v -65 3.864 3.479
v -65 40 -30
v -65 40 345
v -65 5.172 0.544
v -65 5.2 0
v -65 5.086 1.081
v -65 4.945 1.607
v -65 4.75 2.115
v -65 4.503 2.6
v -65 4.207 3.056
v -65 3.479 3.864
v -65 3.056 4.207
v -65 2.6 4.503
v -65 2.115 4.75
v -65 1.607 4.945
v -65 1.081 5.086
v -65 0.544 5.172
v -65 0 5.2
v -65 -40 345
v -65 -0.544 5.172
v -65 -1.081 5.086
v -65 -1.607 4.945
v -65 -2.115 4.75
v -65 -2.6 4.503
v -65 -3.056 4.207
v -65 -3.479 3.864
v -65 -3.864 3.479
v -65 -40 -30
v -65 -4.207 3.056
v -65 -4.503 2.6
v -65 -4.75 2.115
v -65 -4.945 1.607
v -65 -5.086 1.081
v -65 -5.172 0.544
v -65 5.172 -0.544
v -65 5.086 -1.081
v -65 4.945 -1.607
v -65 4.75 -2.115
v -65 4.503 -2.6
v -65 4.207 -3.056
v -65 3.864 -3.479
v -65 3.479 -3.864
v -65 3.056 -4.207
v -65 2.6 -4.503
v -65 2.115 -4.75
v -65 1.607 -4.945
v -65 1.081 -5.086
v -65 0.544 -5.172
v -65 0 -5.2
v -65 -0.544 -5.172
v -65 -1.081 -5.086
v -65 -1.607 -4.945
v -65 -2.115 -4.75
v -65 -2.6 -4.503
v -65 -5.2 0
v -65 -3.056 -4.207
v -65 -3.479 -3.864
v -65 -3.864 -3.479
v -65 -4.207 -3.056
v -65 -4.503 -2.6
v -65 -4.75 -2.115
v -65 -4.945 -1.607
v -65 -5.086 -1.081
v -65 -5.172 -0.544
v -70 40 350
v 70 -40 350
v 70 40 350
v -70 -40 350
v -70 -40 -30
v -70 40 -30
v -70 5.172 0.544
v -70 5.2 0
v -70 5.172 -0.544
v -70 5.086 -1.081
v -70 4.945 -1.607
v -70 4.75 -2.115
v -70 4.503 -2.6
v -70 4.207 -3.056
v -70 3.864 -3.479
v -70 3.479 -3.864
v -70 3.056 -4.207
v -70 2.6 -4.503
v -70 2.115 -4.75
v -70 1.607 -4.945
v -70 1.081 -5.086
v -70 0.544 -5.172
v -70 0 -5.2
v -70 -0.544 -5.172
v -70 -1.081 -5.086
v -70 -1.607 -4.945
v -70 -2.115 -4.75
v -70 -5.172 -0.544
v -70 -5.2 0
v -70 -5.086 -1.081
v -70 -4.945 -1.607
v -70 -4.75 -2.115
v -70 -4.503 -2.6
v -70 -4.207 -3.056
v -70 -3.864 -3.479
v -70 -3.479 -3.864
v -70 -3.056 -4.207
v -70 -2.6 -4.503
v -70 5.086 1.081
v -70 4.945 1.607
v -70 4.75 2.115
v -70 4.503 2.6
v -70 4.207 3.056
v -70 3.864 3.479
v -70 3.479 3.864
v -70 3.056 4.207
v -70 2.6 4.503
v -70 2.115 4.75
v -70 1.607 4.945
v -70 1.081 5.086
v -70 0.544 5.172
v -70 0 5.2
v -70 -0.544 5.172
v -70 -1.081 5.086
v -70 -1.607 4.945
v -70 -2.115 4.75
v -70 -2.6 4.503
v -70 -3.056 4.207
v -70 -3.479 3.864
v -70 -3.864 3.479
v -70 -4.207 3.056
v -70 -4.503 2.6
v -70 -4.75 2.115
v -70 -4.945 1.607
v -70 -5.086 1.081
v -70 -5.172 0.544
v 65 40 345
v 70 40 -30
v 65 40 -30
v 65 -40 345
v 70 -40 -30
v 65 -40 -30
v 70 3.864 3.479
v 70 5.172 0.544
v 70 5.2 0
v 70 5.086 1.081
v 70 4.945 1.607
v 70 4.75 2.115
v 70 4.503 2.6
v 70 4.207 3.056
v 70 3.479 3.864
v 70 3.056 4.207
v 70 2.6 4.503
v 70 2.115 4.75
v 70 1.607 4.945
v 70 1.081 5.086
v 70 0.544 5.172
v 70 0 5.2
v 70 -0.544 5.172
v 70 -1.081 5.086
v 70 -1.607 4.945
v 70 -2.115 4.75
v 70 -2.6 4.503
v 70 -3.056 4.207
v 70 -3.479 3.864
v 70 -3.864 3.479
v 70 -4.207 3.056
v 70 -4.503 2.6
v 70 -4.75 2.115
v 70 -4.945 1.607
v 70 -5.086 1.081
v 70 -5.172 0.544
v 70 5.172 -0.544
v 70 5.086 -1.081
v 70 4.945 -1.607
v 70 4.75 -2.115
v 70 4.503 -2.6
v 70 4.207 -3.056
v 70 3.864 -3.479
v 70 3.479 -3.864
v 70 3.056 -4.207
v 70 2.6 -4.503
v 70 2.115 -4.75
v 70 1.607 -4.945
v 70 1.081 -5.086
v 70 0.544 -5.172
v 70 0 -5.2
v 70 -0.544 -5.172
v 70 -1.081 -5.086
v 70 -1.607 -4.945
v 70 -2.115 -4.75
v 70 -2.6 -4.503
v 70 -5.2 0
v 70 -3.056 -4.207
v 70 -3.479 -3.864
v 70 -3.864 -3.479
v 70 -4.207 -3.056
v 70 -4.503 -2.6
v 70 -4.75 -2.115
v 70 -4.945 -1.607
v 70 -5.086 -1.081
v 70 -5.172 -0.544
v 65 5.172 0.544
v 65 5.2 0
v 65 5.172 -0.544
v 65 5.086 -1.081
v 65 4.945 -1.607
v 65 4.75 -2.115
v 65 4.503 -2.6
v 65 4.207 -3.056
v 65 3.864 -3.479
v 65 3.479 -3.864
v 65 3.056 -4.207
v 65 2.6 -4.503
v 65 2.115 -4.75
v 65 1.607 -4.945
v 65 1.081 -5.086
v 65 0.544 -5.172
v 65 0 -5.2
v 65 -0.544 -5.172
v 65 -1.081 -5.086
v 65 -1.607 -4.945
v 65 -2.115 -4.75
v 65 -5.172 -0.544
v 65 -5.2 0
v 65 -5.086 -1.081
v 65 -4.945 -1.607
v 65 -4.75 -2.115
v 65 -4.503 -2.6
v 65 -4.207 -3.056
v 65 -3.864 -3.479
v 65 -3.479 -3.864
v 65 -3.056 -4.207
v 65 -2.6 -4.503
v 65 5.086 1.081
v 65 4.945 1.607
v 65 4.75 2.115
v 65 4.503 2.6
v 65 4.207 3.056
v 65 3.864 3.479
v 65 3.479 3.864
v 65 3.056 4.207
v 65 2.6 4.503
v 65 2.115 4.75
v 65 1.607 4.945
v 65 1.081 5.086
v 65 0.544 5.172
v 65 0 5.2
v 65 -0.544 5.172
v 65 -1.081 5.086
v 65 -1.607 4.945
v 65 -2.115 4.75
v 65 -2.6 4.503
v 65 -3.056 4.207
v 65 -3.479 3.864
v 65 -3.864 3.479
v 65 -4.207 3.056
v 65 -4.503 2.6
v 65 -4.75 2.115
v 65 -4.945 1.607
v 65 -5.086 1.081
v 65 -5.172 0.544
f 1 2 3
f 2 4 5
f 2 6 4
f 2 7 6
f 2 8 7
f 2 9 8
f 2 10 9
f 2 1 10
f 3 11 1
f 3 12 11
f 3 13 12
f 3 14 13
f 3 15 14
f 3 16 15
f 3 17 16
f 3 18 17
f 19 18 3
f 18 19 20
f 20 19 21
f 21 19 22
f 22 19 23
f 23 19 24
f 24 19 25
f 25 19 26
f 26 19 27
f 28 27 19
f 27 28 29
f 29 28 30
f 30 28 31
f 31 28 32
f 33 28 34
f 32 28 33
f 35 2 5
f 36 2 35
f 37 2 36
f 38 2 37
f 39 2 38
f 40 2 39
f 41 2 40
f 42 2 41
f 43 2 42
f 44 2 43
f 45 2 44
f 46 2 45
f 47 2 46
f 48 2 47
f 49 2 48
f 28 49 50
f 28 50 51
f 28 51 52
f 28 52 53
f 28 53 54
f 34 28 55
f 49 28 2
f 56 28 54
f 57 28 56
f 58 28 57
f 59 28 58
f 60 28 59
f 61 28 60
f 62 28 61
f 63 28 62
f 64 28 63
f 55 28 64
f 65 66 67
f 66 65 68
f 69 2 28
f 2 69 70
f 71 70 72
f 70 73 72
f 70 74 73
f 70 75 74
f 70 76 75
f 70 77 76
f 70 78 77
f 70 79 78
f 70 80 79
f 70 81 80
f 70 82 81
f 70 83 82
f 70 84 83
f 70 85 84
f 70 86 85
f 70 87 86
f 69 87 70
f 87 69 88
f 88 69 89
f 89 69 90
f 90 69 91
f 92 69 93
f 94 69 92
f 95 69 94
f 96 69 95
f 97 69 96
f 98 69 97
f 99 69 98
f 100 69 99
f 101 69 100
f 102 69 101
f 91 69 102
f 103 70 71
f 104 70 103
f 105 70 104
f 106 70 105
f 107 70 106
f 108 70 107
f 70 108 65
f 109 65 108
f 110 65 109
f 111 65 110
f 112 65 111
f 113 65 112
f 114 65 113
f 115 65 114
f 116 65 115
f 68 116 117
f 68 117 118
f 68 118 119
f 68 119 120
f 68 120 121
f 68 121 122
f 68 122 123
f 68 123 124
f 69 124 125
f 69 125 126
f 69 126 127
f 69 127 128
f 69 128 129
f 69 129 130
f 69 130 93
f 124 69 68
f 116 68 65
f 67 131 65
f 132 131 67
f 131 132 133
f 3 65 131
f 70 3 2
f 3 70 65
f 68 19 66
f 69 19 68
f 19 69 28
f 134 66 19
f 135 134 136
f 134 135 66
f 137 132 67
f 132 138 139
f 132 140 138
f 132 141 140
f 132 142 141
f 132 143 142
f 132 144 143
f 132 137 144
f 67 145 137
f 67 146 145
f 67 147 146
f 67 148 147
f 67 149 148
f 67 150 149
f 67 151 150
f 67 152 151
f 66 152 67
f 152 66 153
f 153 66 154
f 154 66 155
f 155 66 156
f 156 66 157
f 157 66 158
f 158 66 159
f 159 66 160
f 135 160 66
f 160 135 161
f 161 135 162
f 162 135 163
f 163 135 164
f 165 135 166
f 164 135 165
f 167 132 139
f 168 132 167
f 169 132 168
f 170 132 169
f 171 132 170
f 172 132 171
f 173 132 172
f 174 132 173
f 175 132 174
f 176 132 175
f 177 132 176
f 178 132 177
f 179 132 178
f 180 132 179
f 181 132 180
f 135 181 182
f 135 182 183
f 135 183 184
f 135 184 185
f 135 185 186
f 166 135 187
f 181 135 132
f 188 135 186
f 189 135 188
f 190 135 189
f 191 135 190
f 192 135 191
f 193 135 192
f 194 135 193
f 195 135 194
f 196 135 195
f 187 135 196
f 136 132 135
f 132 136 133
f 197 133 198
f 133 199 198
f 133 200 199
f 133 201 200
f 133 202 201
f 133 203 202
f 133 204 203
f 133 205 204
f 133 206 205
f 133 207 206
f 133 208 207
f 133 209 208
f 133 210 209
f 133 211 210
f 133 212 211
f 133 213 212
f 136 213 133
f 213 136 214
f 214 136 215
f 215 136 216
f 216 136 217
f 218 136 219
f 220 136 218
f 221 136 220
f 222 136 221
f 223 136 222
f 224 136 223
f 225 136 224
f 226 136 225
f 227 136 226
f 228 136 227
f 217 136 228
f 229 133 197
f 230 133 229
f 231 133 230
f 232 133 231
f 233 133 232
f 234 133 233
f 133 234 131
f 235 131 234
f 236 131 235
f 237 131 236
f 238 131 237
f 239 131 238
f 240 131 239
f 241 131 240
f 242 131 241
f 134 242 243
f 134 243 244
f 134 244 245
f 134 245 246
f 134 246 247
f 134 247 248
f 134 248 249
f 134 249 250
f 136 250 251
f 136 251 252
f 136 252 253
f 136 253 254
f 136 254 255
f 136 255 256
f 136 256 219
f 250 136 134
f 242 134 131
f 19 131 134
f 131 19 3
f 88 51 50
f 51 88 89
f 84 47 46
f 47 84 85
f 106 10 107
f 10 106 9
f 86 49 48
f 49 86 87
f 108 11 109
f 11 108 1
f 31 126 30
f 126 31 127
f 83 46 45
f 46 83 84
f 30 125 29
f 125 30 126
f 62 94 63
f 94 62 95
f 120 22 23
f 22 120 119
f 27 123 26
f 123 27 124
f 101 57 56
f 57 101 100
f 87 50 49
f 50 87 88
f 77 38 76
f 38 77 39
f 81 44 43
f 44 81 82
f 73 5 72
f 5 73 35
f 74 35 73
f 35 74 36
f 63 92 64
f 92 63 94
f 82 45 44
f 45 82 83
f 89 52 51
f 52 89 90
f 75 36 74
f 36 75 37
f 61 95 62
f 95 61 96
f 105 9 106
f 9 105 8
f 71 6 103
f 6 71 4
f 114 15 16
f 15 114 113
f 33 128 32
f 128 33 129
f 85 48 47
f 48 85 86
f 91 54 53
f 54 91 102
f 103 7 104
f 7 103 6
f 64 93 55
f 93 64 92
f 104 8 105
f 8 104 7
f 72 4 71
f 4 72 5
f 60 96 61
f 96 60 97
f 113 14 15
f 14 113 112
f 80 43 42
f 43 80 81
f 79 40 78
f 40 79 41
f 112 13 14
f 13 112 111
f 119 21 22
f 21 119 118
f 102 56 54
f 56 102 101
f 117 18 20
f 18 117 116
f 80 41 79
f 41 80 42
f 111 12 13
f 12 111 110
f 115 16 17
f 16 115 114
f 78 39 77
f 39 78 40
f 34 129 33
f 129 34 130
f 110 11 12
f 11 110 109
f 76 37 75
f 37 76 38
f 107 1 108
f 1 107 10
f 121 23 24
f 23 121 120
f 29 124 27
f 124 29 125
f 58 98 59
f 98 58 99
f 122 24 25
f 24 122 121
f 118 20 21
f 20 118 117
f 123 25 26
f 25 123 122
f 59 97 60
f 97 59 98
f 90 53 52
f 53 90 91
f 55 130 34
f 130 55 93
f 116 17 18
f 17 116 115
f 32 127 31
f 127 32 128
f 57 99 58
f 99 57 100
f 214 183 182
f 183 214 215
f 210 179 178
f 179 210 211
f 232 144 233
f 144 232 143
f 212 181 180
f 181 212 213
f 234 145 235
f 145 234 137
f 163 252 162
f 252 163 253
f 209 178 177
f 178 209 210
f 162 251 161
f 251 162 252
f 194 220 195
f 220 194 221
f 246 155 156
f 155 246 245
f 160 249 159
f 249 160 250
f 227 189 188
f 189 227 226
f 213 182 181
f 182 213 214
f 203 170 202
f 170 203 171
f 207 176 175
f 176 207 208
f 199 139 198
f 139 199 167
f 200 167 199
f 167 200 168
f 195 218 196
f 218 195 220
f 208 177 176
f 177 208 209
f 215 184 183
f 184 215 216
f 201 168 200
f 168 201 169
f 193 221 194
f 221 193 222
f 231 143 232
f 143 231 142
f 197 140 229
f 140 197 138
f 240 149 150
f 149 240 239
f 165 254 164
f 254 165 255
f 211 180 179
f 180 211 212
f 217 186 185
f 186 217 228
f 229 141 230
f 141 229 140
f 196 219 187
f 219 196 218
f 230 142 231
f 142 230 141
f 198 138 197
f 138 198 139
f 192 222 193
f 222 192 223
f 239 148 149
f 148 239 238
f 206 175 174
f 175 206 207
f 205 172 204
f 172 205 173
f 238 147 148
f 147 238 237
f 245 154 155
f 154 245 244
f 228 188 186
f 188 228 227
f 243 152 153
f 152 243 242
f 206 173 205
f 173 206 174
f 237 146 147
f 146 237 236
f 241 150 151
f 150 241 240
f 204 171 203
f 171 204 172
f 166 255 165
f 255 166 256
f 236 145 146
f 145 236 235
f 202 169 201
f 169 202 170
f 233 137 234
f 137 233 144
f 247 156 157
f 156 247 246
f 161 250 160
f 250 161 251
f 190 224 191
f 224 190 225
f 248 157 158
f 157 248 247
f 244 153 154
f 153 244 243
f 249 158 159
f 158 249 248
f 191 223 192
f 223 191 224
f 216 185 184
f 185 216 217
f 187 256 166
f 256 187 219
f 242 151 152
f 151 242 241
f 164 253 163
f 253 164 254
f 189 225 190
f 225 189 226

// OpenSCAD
// file: ../config/parameters.scad
// Global Chassis Dimensions
chassis_width = 720; //kies een veelvoud van 80  
chassis_length = 1040; //kies een veelvoud van 80

// --- Modulair Gatenpatroon (Grid) ---
grid_step = 40; // Universele stapgrootte voor alle gaten

// --- Bereiken (Ranges) voor de Robot Afmetingen ---
// Bereik voor de BREEDTE 
chassis_width_min = 560;
chassis_width_max = 800;
chassis_width_step = 80; // Stapgrootte voor instelbare breedte

// Bereik voor de LENGTE 
chassis_length_min = 720;
chassis_length_max = 1040;
chassis_length_step = 80; // Stapgrootte voor instelbare lengte

// Bereik voor de BASE PLATE 
base_length_min = 800;
base_length_max = 1280;
base_length_step = 80;

// Beam Profile (Purchased Part)
beam_profile = 40;
beam_thickness = 3;    
beam_length_1 = 1000;
beam_length_2 = 1280;

// Upright & Cover
base_plate_length = 1300;
connect_plate_thick = 5; 
upright_height = 500;
top_side_width = 60;
cover_thick = 5;
cover_clearance = 10;  
cover_overlap = 10;
cover_total_height = 530; 
hole_distance_cover = 30;

// Resolution & Preview
$fn = 60; 
exploded_view = false; 
explosion_dist = 800; 

// Motor & Wheel Data
tire_dia = 430;
tire_width = 100;
hub_dia = 160;
hub_width = 140; //specs from Quinder are: Fork width for mounting: 138mm
axle_dia = 10.2; //specs from Quinder are: Mounting hole: max 10.2mm
bolt_dia = 14.2;

// Bracket Geometry universal
bracket_thick = 5;
bracket_bolt_diameter = 10.4; //dikte van de gaten van gaten van de wiel_bracket     
tire_clearance = 130;      
side_plate_top_width = 240;
side_plate_width = 240;

//Side plate
axle_bottom_dist = 35;
extra_space_bracket = 40;
side_hole_start_from_bottom = 20; 
side_hole_pitch = 100; 

tab_length = 40;         // Lengte van de nok/sleuf
tab_offset_y = 40;       // Positie vanaf het midden over de Y-as (uit elkaar)
laser_tolerance = 0.5;   // Extra snijspeling zodat het makkelijk in elkaar schuift

//top plate
bracket_top_hole_dist_x = 80; // De totale gewenste afstand over de X-as
bracket_top_hole_dist_y = 120; // De totale gewenste afstand over de Y-as


arm_height = (tire_dia / 2) + tire_clearance;
inner_width = hub_width;
bracket_total_width = inner_width + (extra_space_bracket*2) + (2 * bracket_thick);
bracket_top_z = arm_height + bracket_thick;

// Axle bracket
axle_hex_width = 85;          
axle_hex_height = 40;
axle_hex_straight_part = 30;   
axle_bracket_thickness = 5;    

axle_hole_diameter = 10.3; //Dikte van het gaten in de axle_bracket
axle_hole_distance = 30; //hoogte vanaf de onderkant tot de wiel ophanging

axle_flat_width = axle_dia; // Gebruikt 10.2 uit parameters 
axle_round_dia = bolt_dia;  // Gebruikt 14.2 uit parameters

// --- Caster Wheel Parameters ---  
bracket_width            = 80;  
bracket_thickness        = 5;
caster_wheel_axle_width  = 130;   
caster_wheel_axle_diameter = 20;
bracket_axle_hole_diameter = 10.4;

pivot_cylinder_dia       = 30;  
pivot_cylinder_height    = 100;  

outer_cylinder_thickness = 5;   
outer_cylinder_height    = 60;  
outer_cylinder_z_offset  = 33;   
kap_speling              = 1;   

tube_width               = 35;  
tube_thickness           = 2;   
tube_length              = 400;
tube_length_min          = 240;
// main file
include <../config/parameters.scad>

// Nieuwe parameter voor het as-gat
bracket_axle_hole_diameter = 10.4;

module caster_wheel_bracket() {
    // Bovenplaat valt precies tussen de zijplaten
    top_plate_width = caster_wheel_axle_width;
    
    // Basis hoogte van de poten (gemeten vanaf as op Z=0 tot onderkant bovenplaat)
    base_leg_height = axle_hole_distance + (tire_dia / 2) + tire_clearance;
    
    // Totale hoogte van de zijplaten (inclusief overlap met de bovenplaat)
    leg_height      = base_leg_height + bracket_thickness;
    
    // Z-posities
    leg_z_center    = -axle_hole_distance + (leg_height / 2);
    top_plate_z     = (tire_dia / 2) + tire_clearance + (bracket_thickness / 2);

    color("#555555") {
        difference() {
            // Het massieve model (bovenplaat en zijplaten samen)
            union() {
                // Bovenplaat
                translate([0, 0, top_plate_z])
                    cube([top_plate_width, bracket_width, bracket_thickness], center=true);

                // Zijplaten
                for (i = [-1, 1]) {
                    translate([i * (caster_wheel_axle_width / 2 + bracket_thickness / 2), 0, leg_z_center])
                        cube([bracket_thickness, bracket_width, leg_height], center=true);
                }
            }
            
            // Enkel de gaten voor de as, precies door de zijplaten (Z=0)
            for (i = [-1, 1]) {
                translate([i * (caster_wheel_axle_width / 2 + bracket_thickness / 2), 0, 0])
                    rotate([0, 90, 0])
                        // h = bracket_thickness + 2 (voor een schone snede aan beide kanten)
                        cylinder(d = bracket_axle_hole_diameter, h = bracket_thickness + 5, center = true);
            }
        }
    }
}

// Test render (verwijder of comment uit bij gebruik in assembly)
caster_wheel_bracket();
